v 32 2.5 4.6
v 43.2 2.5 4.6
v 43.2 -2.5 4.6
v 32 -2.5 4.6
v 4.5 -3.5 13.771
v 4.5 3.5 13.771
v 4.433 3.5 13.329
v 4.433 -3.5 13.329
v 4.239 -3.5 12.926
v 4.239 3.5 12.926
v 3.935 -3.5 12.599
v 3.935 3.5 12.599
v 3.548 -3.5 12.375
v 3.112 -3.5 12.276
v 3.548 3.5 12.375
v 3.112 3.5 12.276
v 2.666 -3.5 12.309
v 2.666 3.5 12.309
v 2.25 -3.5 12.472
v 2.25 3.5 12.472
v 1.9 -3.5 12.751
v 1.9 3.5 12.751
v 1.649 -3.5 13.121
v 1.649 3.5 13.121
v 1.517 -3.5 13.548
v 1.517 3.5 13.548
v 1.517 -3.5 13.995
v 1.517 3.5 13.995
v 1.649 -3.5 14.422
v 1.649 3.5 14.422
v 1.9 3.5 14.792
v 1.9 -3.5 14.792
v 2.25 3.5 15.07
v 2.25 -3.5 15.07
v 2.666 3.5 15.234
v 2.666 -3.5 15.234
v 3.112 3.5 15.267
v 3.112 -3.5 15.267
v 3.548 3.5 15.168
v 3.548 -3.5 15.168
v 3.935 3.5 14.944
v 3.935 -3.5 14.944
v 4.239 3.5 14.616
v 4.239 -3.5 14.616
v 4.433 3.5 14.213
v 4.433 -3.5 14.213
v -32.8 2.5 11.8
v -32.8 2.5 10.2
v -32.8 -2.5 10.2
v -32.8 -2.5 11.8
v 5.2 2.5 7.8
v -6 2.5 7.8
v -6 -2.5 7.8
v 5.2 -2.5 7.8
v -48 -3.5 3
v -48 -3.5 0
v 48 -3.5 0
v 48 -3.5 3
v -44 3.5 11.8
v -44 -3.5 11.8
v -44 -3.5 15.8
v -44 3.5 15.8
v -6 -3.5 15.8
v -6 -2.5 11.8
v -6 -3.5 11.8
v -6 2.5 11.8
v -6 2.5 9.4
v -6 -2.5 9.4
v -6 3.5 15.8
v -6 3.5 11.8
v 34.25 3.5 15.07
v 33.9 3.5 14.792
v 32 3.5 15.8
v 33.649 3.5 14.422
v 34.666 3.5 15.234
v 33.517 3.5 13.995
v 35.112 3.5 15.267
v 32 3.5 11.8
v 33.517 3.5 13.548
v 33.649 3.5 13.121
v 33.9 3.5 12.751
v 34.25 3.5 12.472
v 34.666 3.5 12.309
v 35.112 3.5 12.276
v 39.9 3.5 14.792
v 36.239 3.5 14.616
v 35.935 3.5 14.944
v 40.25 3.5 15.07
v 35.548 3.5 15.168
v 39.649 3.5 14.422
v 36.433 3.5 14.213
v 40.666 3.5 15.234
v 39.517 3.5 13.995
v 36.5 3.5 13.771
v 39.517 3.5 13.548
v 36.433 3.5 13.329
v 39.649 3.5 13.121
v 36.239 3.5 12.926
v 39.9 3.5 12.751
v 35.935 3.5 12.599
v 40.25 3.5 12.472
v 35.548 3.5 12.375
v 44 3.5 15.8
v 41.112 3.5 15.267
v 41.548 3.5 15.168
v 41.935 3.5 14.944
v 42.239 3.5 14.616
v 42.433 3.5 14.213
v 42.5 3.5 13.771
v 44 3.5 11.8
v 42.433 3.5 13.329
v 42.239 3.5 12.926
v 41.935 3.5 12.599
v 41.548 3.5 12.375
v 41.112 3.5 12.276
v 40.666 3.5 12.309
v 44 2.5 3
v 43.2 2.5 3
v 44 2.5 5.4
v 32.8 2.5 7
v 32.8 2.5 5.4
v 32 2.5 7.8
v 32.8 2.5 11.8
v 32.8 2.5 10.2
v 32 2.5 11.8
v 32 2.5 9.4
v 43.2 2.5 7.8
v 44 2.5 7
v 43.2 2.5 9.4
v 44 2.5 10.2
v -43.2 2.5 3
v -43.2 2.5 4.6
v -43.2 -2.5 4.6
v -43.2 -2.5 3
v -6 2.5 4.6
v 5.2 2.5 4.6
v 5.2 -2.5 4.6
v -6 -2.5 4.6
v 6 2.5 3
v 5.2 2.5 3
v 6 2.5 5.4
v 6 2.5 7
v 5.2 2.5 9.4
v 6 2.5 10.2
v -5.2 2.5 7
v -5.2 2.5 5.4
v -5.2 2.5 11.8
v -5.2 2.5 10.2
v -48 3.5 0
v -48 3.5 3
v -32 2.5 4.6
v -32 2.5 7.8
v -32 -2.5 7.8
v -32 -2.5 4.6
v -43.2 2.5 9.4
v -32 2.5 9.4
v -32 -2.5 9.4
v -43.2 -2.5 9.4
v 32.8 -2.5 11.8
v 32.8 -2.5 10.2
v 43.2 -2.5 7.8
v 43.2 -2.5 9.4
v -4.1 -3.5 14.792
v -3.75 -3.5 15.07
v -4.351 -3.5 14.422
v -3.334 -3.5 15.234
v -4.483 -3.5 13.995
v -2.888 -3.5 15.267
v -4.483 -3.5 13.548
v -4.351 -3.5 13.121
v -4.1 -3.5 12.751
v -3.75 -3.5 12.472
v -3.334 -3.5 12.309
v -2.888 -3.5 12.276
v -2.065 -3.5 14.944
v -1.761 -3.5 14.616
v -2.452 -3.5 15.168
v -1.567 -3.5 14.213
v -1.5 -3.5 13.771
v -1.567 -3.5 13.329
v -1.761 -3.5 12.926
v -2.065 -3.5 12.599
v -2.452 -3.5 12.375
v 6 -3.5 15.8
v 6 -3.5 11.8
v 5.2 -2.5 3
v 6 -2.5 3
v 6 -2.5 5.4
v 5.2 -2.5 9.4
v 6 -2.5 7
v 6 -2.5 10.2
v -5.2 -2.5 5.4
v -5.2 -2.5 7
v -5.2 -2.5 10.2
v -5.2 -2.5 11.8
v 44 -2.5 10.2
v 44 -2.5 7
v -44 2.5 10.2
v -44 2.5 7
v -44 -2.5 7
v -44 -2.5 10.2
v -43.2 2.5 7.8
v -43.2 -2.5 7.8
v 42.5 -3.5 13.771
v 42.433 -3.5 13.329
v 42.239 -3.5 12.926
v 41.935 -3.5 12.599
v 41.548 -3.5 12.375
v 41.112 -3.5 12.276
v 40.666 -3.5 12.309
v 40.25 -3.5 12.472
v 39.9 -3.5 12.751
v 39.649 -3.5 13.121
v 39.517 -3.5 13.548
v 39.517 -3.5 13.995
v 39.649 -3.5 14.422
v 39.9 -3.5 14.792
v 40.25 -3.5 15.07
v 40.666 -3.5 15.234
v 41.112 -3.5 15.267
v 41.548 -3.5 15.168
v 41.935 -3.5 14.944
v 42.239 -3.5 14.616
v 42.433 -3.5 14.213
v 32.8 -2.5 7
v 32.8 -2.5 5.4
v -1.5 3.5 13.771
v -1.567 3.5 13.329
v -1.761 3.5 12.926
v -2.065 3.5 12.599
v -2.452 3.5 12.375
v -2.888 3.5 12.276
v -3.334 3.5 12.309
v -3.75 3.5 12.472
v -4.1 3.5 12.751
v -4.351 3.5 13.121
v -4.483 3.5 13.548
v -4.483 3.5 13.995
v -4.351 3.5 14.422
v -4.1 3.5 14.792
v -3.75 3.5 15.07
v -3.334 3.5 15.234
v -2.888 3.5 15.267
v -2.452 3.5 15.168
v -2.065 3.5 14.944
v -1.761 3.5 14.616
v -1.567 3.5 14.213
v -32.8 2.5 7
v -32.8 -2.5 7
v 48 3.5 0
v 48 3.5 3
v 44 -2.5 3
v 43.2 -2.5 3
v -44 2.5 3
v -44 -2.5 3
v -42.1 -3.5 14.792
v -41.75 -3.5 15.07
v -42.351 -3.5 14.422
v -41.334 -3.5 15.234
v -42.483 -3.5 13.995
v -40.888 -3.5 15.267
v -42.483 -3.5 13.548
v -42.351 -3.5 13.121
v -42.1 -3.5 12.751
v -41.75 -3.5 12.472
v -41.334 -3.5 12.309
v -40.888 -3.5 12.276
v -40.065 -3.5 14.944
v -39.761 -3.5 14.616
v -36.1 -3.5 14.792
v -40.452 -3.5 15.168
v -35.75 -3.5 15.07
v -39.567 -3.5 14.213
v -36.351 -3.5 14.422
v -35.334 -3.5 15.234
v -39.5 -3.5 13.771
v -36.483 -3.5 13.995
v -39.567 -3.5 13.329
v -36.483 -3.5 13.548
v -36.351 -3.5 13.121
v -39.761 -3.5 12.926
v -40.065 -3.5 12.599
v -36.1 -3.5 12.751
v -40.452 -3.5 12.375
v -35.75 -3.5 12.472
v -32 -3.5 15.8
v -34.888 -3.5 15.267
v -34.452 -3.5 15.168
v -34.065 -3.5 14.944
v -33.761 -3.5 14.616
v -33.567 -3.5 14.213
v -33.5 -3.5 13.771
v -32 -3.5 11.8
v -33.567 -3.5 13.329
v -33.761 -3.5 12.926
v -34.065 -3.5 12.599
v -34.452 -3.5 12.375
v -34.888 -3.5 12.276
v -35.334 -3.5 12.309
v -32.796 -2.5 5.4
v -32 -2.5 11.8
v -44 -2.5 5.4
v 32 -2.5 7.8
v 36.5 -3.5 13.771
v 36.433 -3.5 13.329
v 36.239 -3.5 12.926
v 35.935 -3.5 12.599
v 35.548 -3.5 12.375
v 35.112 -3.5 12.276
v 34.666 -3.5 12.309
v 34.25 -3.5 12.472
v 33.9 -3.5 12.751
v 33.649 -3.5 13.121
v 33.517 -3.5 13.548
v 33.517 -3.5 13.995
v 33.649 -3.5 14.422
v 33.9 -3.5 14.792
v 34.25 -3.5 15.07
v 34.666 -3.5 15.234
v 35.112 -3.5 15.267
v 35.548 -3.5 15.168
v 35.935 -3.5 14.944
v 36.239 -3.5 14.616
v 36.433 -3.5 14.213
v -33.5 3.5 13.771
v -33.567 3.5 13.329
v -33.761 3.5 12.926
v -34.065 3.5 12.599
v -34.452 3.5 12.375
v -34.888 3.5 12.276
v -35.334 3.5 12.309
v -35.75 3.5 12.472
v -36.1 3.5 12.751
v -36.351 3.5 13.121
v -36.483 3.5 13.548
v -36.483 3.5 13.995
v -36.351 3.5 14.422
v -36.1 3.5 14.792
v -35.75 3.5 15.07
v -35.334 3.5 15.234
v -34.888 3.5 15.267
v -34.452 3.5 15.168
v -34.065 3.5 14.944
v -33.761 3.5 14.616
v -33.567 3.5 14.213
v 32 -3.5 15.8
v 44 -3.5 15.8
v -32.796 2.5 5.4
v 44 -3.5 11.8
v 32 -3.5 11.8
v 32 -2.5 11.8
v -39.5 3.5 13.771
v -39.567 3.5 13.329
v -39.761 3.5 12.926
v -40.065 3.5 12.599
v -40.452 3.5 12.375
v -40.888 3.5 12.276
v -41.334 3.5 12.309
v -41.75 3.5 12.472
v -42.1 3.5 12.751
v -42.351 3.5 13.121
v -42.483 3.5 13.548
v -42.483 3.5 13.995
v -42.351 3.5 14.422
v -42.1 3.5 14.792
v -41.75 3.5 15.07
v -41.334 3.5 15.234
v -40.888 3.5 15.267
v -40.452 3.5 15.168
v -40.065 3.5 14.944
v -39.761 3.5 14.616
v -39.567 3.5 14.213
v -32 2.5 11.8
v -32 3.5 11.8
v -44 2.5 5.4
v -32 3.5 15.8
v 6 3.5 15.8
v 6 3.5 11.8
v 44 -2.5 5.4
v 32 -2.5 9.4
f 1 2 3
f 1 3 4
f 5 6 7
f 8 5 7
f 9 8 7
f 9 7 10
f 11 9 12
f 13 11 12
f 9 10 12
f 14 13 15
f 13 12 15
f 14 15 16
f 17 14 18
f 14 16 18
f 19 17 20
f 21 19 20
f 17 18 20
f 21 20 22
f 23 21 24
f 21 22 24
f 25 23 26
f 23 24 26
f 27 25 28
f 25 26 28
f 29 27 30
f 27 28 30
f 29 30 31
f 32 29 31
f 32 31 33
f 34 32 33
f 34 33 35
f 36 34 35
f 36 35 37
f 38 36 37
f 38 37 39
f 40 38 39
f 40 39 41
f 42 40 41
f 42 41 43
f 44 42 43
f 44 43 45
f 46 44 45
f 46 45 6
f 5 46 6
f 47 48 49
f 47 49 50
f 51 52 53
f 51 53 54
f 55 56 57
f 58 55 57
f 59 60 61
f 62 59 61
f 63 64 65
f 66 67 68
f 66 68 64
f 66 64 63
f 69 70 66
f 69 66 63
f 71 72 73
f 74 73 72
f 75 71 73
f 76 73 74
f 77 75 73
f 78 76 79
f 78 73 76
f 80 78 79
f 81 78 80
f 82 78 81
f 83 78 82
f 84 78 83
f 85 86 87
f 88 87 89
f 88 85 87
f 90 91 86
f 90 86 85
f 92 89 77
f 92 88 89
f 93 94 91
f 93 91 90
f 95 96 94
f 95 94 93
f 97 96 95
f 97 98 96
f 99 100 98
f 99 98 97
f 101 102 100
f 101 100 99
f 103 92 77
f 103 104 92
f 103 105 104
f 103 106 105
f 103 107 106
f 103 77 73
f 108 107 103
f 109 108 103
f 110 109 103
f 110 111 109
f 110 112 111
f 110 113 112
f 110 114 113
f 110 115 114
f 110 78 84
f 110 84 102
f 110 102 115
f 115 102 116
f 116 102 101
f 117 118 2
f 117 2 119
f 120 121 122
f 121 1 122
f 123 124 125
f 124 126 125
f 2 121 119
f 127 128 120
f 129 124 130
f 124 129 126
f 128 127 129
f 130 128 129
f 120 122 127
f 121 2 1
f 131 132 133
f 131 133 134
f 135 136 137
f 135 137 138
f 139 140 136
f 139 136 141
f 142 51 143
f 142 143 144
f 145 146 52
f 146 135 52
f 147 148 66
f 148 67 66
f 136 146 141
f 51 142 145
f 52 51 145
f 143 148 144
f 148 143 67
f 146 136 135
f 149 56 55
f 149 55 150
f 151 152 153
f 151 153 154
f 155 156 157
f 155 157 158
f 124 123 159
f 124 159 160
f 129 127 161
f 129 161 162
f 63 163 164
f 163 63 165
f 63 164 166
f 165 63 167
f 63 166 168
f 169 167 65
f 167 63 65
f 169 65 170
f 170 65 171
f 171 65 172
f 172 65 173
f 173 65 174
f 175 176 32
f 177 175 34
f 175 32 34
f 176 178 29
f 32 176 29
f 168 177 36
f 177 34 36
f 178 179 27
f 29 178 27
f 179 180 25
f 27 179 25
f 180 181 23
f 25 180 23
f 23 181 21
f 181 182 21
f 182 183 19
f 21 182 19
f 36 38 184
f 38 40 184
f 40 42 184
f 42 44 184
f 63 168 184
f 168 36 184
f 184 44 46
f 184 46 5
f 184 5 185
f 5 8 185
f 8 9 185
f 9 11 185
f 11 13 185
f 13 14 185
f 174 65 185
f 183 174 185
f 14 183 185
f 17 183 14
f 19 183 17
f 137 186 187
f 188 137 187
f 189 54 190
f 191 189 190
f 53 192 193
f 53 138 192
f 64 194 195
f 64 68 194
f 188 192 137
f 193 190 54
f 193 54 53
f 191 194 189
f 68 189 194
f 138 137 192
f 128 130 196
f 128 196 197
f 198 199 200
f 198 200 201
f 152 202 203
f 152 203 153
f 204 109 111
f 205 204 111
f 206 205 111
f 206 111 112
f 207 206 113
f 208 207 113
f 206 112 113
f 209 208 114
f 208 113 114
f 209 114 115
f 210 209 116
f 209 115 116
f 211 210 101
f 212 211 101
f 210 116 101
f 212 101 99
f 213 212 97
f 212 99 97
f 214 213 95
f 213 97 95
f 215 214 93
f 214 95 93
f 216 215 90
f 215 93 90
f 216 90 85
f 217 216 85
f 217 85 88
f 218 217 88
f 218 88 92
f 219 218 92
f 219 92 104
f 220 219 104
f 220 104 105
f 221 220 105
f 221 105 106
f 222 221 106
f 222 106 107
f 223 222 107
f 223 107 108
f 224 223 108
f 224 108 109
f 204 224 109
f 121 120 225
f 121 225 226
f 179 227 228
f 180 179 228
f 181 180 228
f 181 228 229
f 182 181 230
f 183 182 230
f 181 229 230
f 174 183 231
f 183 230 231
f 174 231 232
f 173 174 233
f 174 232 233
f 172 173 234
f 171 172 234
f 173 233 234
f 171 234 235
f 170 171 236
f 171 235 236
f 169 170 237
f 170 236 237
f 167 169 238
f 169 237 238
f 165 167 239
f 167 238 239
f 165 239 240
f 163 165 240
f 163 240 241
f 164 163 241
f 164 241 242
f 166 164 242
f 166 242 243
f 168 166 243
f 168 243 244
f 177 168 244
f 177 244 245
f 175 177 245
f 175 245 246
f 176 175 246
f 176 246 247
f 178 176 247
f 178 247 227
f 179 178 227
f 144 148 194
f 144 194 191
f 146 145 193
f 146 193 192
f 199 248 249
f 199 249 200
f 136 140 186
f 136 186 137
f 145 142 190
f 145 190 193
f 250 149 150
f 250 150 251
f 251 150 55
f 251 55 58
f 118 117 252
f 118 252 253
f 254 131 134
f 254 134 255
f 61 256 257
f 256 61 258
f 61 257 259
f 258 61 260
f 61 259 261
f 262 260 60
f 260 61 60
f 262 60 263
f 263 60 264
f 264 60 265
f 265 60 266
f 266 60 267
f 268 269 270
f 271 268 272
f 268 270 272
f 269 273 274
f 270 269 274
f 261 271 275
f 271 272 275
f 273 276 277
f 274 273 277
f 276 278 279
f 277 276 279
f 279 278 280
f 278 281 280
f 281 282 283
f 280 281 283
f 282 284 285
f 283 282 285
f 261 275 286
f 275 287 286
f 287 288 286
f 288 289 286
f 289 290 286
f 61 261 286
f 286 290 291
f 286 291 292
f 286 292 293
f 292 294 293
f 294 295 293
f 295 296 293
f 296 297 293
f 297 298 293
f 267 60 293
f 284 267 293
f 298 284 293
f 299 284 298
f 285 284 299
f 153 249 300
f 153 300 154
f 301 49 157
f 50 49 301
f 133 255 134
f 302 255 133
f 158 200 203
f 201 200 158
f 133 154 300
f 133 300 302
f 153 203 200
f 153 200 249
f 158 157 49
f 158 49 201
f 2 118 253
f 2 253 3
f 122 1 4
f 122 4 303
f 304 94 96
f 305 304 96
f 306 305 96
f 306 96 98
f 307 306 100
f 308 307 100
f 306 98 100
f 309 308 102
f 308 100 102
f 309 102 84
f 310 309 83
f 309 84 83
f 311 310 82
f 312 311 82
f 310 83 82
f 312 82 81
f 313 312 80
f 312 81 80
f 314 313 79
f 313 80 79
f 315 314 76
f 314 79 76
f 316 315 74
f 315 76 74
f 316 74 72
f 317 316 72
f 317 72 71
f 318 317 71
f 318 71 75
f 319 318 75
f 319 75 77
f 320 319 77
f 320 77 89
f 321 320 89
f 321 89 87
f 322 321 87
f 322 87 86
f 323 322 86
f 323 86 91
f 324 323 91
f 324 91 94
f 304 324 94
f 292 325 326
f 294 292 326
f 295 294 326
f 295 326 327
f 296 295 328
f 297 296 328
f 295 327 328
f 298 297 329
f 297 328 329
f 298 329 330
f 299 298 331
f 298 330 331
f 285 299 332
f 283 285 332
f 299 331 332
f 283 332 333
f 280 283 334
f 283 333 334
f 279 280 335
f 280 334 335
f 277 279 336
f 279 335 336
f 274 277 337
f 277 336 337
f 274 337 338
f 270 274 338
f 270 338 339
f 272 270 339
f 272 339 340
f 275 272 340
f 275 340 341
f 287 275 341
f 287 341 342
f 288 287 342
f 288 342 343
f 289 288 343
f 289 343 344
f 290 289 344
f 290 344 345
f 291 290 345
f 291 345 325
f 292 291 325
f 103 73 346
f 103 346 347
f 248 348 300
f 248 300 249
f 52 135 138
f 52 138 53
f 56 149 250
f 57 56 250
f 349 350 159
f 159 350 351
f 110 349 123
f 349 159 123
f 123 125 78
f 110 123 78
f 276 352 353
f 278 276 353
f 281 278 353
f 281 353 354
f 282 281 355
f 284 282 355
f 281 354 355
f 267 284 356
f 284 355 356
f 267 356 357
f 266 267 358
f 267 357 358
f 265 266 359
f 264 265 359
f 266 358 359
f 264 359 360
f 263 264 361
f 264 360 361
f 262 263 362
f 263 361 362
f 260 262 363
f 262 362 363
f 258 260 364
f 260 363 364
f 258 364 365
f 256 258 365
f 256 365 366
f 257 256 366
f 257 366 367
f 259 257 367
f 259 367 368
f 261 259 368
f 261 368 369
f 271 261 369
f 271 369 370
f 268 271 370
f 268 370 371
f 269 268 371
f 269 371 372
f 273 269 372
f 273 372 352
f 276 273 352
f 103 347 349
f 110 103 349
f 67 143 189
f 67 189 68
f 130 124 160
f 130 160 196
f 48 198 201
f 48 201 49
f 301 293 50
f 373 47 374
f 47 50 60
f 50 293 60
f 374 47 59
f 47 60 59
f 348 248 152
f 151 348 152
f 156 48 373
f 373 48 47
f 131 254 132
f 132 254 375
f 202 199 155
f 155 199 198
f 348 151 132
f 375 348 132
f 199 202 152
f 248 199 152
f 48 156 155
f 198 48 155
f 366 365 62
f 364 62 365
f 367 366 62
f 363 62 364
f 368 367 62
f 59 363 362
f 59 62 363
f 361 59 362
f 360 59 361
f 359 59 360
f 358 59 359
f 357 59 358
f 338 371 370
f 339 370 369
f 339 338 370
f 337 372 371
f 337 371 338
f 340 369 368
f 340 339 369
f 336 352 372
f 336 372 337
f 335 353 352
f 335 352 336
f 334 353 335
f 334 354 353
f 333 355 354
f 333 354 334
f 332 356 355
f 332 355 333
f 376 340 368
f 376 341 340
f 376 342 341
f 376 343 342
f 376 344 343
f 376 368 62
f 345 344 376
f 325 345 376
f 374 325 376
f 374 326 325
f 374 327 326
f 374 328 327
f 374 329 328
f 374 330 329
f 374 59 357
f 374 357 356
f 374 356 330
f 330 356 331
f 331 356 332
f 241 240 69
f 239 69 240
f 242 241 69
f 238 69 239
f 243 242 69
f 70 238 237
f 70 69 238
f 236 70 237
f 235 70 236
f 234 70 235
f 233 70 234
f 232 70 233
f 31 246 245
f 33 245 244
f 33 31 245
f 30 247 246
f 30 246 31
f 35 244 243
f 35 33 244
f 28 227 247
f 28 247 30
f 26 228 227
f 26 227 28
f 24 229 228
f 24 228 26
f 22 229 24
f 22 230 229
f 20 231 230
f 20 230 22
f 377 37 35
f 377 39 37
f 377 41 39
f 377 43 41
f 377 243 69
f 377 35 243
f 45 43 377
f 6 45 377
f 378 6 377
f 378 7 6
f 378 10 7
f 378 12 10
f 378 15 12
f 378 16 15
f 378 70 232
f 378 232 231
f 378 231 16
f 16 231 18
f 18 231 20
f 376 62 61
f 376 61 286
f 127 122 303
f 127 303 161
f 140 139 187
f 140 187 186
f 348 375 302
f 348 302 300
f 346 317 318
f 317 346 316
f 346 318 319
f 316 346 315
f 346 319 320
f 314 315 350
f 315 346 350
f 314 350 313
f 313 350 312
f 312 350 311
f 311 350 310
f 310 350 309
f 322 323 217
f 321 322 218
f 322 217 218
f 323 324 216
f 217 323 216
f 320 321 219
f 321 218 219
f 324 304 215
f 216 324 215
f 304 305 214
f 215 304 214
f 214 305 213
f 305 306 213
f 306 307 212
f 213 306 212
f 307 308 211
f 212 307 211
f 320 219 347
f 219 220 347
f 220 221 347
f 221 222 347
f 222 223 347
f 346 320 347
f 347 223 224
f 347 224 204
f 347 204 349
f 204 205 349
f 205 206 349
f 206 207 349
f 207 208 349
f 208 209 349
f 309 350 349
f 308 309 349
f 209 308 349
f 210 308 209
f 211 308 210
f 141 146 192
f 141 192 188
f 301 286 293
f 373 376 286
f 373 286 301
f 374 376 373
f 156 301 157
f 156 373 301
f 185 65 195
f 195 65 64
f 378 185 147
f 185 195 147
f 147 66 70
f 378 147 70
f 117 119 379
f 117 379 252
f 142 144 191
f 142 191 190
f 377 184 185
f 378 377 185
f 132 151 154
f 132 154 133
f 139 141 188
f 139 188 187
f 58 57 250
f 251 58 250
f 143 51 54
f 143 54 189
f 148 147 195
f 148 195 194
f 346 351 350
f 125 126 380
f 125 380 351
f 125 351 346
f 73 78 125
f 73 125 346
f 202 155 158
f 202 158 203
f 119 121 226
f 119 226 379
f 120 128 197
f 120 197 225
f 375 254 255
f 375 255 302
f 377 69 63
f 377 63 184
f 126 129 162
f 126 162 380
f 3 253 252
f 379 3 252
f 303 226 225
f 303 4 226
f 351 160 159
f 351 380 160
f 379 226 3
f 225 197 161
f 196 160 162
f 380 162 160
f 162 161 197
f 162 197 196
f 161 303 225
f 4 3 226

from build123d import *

# Parameters (mm, degrees)
SKETCH_1_W          = 96
SKETCH_1_H          = 7
EXTRUDE_1_DEPTH     = 3
EXTRUDE_2_DEPTH     = 7
EXTRUDE_2_2_DEPTH   = 7
EXTRUDE_2_3_DEPTH   = 7
SKETCH_3_R          = 1.5
CUT_EXTRUDE_1_DEPTH = 10
SKETCH_4_W          = 8.8
SKETCH_4_H          = 1.825750082
SKETCH_4_H_2        = 1.684722937
CUT_EXTRUDE_2_DEPTH = 107


with BuildPart() as part:
    # 스케치1 → 보스-돌출1 (new body)
    with BuildSketch(Plane.XY):
        Rectangle(SKETCH_1_W, SKETCH_1_H)
    extrude(amount=EXTRUDE_1_DEPTH)


with BuildPart() as body_2:
    # 스케치2 → 보스-돌출2 (new body)
    with BuildSketch(Plane(origin=(0, 3.5, 0), x_dir=(1, 0, 0), z_dir=(0, 1, 0))):
        Polygon((-44, -3), (-44, -5.4), (-32.795959597, -5.4), (-32.8, -7), (-44, -7), (-44, -10.2), (-32.8, -10.2), (-32.8, -11.8), (-44, -11.8), (-44, -15.8), (-32, -15.8), (-32, -9.4), (-43.2, -9.4), (-43.2, -7.8), (-32, -7.8), (-32, -4.6), (-43.2, -4.6), (-43.2, -3), align=None)
    extrude(amount=-EXTRUDE_2_DEPTH)


with BuildPart() as body_3:
    # 스케치2 → Extrude 2 2 (new body)
    with BuildSketch(Plane(origin=(0, 3.5, 0), x_dir=(1, 0, 0), z_dir=(0, 1, 0))):
        Polygon((44, -3), (43.2, -3), (43.2, -4.6), (32, -4.6), (32, -7.8), (43.2, -7.8), (43.2, -9.4), (32, -9.4), (32, -15.8), (44, -15.8), (44, -11.8), (32.8, -11.8), (32.8, -10.2), (44, -10.2), (44, -7), (32.8, -7), (32.8, -5.4), (44, -5.4), align=None)
    extrude(amount=-EXTRUDE_2_2_DEPTH)


with BuildPart() as body_4:
    # 스케치2 → Extrude 2 3 (new body)
    with BuildSketch(Plane(origin=(0, 3.5, 0), x_dir=(1, 0, 0), z_dir=(0, 1, 0))):
        Polygon((6, -3), (5.2, -3), (5.2, -4.6), (-6, -4.6), (-6, -7.8), (5.2, -7.8), (5.2, -9.4), (-6, -9.4), (-6, -15.8), (6, -15.8), (6, -11.8), (-5.2, -11.8), (-5.2, -10.2), (6, -10.2), (6, -7), (-5.2, -7), (-5.2, -5.4), (6, -5.4), align=None)
    extrude(amount=-EXTRUDE_2_3_DEPTH)


with BuildPart() as cut_extrude_1_tool:
    # 스케치3 → 컷-돌출1 (new body)
    with BuildSketch(Plane(origin=(0, 3.5, 0), x_dir=(1, 0, 0), z_dir=(0, 1, 0))):
        with Locations((-41, -13.771363705)):
            Circle(SKETCH_3_R)
        with Locations((-35, -13.771363705)):
            Circle(SKETCH_3_R)
        with Locations((-3, -13.771363705)):
            Circle(SKETCH_3_R)
        with Locations((3, -13.771363705)):
            Circle(SKETCH_3_R)
        with Locations((35, -13.771363705)):
            Circle(SKETCH_3_R)
        with Locations((41, -13.771363705)):
            Circle(SKETCH_3_R)
    extrude(amount=-CUT_EXTRUDE_1_DEPTH)


with BuildPart() as body_2_1:
    add(body_2.part)

    # 컷-돌출1: cut by cut_extrude_1_tool
    add(cut_extrude_1_tool.part, mode=Mode.SUBTRACT)


with BuildPart() as body_3_1:
    add(body_3.part)

    # 컷-돌출1: cut by cut_extrude_1_tool
    add(cut_extrude_1_tool.part, mode=Mode.SUBTRACT)


with BuildPart() as body_4_1:
    add(body_4.part)

    # 컷-돌출1: cut by cut_extrude_1_tool
    add(cut_extrude_1_tool.part, mode=Mode.SUBTRACT)


with BuildPart() as cut_extrude_2_tool:
    # 스케치4 → 컷-돌출2 (new body)
    with BuildSketch(Plane.ZY.offset(48)):
        with Locations((7.4, 3.412875041)):
            Rectangle(SKETCH_4_W, SKETCH_4_H)
        with Locations((7.4, -3.342361469)):
            Rectangle(SKETCH_4_W, SKETCH_4_H_2)
    extrude(amount=-CUT_EXTRUDE_2_DEPTH)


with BuildPart() as body_2_2:
    add(body_2_1.part)

    # 컷-돌출2: cut by cut_extrude_2_tool
    add(cut_extrude_2_tool.part, mode=Mode.SUBTRACT)


with BuildPart() as body_3_2:
    add(body_3_1.part)

    # 컷-돌출2: cut by cut_extrude_2_tool
    add(cut_extrude_2_tool.part, mode=Mode.SUBTRACT)


with BuildPart() as body_4_2:
    add(body_4_1.part)

    # 컷-돌출2: cut by cut_extrude_2_tool
    add(cut_extrude_2_tool.part, mode=Mode.SUBTRACT)


solid = Compound([part.part, body_2_2.part, body_3_2.part, body_4_2.part])
